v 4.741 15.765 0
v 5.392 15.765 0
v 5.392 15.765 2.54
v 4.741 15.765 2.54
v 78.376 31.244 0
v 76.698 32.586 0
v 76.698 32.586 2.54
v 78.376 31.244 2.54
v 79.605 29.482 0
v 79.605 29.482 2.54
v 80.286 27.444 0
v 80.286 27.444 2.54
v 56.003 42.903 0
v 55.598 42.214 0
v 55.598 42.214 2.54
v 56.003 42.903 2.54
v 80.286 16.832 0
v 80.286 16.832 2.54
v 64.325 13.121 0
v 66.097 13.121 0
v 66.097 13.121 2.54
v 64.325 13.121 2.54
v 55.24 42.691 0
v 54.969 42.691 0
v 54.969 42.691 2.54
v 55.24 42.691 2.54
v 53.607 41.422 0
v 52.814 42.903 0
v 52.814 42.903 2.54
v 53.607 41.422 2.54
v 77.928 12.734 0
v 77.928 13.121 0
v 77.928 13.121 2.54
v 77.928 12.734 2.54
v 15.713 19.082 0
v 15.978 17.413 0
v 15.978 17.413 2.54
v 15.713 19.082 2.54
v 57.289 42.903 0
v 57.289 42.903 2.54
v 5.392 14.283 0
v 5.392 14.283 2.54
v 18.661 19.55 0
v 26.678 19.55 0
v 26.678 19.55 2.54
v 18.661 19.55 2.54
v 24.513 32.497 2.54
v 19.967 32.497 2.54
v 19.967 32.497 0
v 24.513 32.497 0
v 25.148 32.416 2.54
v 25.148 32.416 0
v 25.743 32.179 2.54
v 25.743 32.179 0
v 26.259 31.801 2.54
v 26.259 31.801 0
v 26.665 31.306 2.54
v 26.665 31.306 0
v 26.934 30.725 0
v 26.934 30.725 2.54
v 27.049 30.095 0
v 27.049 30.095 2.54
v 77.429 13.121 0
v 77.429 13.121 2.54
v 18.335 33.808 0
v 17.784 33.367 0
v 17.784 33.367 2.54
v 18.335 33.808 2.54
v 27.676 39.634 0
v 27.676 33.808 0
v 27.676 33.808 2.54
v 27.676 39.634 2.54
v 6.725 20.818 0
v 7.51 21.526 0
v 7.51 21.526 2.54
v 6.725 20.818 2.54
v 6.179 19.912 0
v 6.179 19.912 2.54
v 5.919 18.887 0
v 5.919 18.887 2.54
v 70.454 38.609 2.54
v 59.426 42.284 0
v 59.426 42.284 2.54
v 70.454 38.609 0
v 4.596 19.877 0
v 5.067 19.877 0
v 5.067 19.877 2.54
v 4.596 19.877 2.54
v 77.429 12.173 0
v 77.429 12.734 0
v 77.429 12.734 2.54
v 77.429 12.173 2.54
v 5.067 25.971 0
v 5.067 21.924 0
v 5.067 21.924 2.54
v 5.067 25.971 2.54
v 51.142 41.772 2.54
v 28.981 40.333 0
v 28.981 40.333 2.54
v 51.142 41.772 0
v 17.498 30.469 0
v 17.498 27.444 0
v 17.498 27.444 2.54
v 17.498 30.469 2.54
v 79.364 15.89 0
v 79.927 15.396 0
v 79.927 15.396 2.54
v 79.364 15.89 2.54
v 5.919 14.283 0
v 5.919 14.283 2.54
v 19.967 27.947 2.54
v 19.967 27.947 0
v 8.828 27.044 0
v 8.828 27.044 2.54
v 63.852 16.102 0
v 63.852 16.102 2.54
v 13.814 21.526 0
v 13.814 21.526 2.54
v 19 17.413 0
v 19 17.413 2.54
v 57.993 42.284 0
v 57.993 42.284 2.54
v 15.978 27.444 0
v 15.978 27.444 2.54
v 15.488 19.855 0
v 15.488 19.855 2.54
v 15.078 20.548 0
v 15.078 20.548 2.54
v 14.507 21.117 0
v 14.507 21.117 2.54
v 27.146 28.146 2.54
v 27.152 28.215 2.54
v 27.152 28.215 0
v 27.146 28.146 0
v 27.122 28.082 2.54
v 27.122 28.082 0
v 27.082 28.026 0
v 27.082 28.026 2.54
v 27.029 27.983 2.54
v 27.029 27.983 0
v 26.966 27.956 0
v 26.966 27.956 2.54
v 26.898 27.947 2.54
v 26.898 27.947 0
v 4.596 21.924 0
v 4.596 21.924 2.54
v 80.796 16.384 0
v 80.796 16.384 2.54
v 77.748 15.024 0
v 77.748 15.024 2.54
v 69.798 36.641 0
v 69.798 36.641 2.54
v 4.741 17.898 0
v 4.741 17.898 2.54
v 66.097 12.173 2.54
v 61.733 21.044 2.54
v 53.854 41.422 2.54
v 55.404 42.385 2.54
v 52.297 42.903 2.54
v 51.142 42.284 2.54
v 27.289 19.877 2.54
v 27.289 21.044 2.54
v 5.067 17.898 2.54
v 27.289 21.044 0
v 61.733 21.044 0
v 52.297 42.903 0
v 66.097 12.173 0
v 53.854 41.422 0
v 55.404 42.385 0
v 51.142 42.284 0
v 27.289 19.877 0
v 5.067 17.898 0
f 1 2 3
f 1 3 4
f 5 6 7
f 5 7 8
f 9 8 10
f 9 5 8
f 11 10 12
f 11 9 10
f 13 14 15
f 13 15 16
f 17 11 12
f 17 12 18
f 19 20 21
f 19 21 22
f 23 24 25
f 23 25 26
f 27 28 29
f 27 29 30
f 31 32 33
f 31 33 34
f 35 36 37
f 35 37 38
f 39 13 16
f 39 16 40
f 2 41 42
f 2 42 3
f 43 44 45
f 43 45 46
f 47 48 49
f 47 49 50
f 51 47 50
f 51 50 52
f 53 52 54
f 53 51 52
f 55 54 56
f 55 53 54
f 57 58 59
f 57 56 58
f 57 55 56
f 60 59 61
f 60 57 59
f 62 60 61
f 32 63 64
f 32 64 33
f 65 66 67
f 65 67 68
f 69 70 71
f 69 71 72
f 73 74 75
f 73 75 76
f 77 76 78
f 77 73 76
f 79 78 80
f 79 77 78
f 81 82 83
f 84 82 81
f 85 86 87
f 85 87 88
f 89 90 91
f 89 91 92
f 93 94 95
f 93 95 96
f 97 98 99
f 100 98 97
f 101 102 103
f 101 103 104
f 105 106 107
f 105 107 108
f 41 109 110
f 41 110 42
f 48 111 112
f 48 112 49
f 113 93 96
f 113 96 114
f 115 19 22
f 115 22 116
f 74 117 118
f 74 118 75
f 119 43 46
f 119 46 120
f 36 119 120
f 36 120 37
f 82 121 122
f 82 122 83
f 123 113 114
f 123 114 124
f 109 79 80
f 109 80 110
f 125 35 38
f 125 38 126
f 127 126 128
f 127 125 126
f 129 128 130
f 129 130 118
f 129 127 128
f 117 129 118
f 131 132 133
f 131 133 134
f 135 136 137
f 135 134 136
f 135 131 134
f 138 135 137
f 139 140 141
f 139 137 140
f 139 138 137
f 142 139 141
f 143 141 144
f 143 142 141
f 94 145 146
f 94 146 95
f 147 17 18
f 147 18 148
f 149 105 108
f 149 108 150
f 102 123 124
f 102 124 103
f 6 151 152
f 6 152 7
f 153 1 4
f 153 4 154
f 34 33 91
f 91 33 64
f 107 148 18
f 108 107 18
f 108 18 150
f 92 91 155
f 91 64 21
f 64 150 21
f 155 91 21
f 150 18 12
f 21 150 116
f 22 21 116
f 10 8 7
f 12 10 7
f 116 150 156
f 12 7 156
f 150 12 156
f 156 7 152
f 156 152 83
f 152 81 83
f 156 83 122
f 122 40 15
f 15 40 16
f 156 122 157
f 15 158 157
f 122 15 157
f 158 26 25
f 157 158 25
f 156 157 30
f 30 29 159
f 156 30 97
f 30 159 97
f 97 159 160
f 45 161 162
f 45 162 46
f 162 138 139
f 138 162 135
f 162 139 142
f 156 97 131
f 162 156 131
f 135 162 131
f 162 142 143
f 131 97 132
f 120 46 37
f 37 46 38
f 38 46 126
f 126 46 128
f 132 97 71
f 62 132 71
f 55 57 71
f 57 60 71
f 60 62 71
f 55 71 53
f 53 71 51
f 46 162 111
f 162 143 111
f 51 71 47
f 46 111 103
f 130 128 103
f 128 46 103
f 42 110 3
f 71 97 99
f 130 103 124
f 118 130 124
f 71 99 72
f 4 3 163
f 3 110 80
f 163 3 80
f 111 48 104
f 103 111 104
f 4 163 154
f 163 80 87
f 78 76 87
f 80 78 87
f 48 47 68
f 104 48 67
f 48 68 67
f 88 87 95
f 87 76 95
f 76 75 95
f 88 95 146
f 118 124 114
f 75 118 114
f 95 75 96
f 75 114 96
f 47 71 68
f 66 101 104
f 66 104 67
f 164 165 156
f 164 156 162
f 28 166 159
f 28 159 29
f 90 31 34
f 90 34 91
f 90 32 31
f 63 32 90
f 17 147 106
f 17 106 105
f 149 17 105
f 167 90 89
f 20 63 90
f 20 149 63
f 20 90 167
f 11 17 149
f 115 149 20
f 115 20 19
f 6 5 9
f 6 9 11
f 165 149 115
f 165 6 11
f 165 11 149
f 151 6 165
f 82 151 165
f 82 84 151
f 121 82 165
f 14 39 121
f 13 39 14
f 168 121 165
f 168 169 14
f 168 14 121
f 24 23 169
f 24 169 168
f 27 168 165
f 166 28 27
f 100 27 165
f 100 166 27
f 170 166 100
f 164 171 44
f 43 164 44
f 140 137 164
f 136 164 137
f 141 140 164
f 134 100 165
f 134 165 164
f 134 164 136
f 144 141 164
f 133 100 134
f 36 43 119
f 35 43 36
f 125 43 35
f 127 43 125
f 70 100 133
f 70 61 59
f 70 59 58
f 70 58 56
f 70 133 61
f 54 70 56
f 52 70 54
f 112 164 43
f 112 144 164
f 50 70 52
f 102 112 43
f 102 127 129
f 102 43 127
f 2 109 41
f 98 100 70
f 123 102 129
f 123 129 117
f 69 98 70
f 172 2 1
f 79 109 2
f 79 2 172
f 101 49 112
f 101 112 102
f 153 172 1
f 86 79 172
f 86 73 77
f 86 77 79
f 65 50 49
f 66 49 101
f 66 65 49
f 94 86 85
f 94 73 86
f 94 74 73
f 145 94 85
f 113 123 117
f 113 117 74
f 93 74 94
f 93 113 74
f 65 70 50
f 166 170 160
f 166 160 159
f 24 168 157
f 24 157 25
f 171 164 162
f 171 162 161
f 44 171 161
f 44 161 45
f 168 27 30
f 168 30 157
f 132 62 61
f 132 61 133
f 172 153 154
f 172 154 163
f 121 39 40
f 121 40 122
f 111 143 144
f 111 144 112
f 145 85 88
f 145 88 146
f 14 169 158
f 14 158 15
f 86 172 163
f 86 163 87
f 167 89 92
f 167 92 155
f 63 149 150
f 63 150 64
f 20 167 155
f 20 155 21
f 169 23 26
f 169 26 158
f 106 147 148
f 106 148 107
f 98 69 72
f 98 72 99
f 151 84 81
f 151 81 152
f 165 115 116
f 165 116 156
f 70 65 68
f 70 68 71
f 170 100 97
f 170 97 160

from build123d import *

# Parameters (mm, degrees)
BOSS_EXTRUDE1_DEPTH     = 2.54
CUT_EXTRUDE1_DEPTH      = 1
CUT_EXTRUDE1_DEPTH_BACK = 3.54


with BuildPart() as part:
    # Sketch1 → Boss-Extrude1 (new body)
    with BuildSketch(Plane.XY):
        with BuildLine():
            Line((5.391744354, 14.282870357), (5.391744354, 15.765239208))
            Line((5.391744354, 15.765239208), (4.741317205, 15.765239208))
            Line((4.741317205, 15.765239208), (4.741317205, 17.898035208))
            Line((4.741317205, 17.898035208), (5.066530779, 17.898035208))
            Line((5.066530779, 17.898035208), (5.066530779, 19.876846363))
            Line((5.066530779, 19.876846363), (4.595500514, 19.876846363))
            Line((4.595500514, 19.876846363), (4.595500514, 21.924330523))
            Line((4.595500514, 21.924330523), (5.066530779, 21.924330523))
            Line((5.066530779, 21.924330523), (5.066530779, 25.970641097))
            Line((5.066530779, 25.970641097), (8.827667811, 27.043705429))
            Line((8.827667811, 27.043705429), (15.977546955, 27.444115261))
            Line((15.977546955, 27.444115261), (17.49779469, 27.444115261))
            Line((17.49779469, 27.444115261), (17.49779469, 28.820580801))
            Line((17.49779469, 28.820580801), (17.49779469, 30.468511328))
            Line((17.49779469, 30.468511328), (17.783535415, 33.367238893))
            Line((17.783535415, 33.367238893), (18.335195157, 33.807947262))
            Line((18.335195157, 33.807947262), (27.675822425, 33.807947262))
            Line((27.675822425, 33.807947262), (27.675822425, 37.185188617))
            Line((27.675822425, 37.185188617), (27.675822425, 39.633723234))
            Line((27.675822425, 39.633723234), (28.980773711, 40.33269643))
            Line((28.980773711, 40.33269643), (51.141827963, 41.772000615))
            Line((51.141827963, 41.772000615), (51.141827963, 42.284268418))
            Line((51.141827963, 42.284268418), (52.296667979, 42.902837268))
            Line((52.296667979, 42.902837268), (52.814231672, 42.902837268))
            Line((52.814231672, 42.902837268), (53.607165269, 41.42246617))
            Line((53.607165269, 41.42246617), (53.853833977, 41.42246617))
            Line((53.853833977, 41.42246617), (54.968769782, 42.69106932))
            Line((54.968769782, 42.69106932), (55.239970384, 42.69106932))
            Line((55.239970384, 42.69106932), (55.403969099, 42.384891149))
            Line((55.403969099, 42.384891149), (55.598324769, 42.214078003))
            Line((55.598324769, 42.214078003), (56.003141291, 42.902837268))
            Line((56.003141291, 42.902837268), (57.289041594, 42.902837268))
            Line((57.289041594, 42.902837268), (57.992865427, 42.284268418))
            Line((57.992865427, 42.284268418), (59.425813052, 42.284268418))
            Line((59.425813052, 42.284268418), (70.454348226, 38.609355629))
            Line((70.454348226, 38.609355629), (69.798459804, 36.641012721))
            Line((69.798459804, 36.641012721), (76.698212964, 32.585700195))
            ThreePointArc((76.698212964, 32.585700195), (79.05388987, 30.406820911), (80.286409178, 27.444115261))
            Line((80.286409178, 27.444115261), (80.286409178, 21.776774623))
            Line((80.286409178, 21.776774623), (80.286409178, 16.831637208))
            Line((80.286409178, 16.831637208), (80.795500514, 16.384212686))
            Line((80.795500514, 16.384212686), (79.926633106, 15.395592601))
            Line((79.926633106, 15.395592601), (79.364194198, 15.889902643))
            Line((79.364194198, 15.889902643), (77.747695473, 15.024054782))
            Line((77.747695473, 15.024054782), (77.42948761, 13.121408956))
            Line((77.42948761, 13.121408956), (77.927923916, 13.121408956))
            Line((77.927923916, 13.121408956), (77.927923916, 12.734414773))
            Line((77.927923916, 12.734414773), (77.42948761, 12.734414773))
            Line((77.42948761, 12.734414773), (77.42948761, 12.173202104))
            Line((77.42948761, 12.173202104), (66.096875424, 12.173202104))
            Line((66.096875424, 12.173202104), (66.096875424, 13.121408956))
            Line((66.096875424, 13.121408956), (64.324624891, 13.121408956))
            Line((64.324624891, 13.121408956), (63.852024749, 16.101690785))
            Line((63.852024749, 16.101690785), (61.733497308, 21.0437176))
            Line((61.733497308, 21.0437176), (27.288990511, 21.0437176))
            Line((27.288990511, 21.0437176), (27.288990511, 19.876846363))
            Line((27.288990511, 19.876846363), (26.678188815, 19.54968165))
            Line((26.678188815, 19.54968165), (18.661272623, 19.54968165))
            Line((18.661272623, 19.54968165), (19.000020898, 17.4134882))
            Line((19.000020898, 17.4134882), (15.977546955, 17.4134882))
            Line((15.977546955, 17.4134882), (15.7129382, 19.082147588))
            ThreePointArc((15.7129382, 19.082147588), (15.077518105, 20.548119931), (13.813657174, 21.525611186))
            Line((13.813657174, 21.525611186), (7.510402991, 21.525611186))
            ThreePointArc((7.510402991, 21.525611186), (6.418297754, 20.38537823), (5.919290284, 18.887440786))
            Line((5.919290284, 18.887440786), (5.919290284, 14.282870357))
            Line((5.919290284, 14.282870357), (5.391744354, 14.282870357))
        make_face()
    extrude(amount=BOSS_EXTRUDE1_DEPTH)

    # Sketch2 → Cut-Extrude1 (cut, two sides)
    with BuildSketch(Plane.XY.offset(2.54)) as cut_extrude1_sk:
        with BuildLine():
            Line((19.967423309, 32.496521322), (24.512705526, 32.496521322))
            ThreePointArc((24.512705526, 32.496521322), (26.259153953, 31.800841764), (27.048934293, 30.094881867))
            Line((27.048934293, 30.094881867), (27.151503603, 28.214727135))
            ThreePointArc((27.151503603, 28.214727135), (27.08231277, 28.026246238), (26.897880726, 27.946891081))
            Line((26.897880726, 27.946891081), (19.967423309, 27.946891081))
            Line((19.967423309, 27.946891081), (19.967423309, 32.496521322))
        make_face()
    extrude(amount=CUT_EXTRUDE1_DEPTH, mode=Mode.SUBTRACT)
    extrude(cut_extrude1_sk.sketch, amount=-CUT_EXTRUDE1_DEPTH_BACK, mode=Mode.SUBTRACT)


solid = part.part
